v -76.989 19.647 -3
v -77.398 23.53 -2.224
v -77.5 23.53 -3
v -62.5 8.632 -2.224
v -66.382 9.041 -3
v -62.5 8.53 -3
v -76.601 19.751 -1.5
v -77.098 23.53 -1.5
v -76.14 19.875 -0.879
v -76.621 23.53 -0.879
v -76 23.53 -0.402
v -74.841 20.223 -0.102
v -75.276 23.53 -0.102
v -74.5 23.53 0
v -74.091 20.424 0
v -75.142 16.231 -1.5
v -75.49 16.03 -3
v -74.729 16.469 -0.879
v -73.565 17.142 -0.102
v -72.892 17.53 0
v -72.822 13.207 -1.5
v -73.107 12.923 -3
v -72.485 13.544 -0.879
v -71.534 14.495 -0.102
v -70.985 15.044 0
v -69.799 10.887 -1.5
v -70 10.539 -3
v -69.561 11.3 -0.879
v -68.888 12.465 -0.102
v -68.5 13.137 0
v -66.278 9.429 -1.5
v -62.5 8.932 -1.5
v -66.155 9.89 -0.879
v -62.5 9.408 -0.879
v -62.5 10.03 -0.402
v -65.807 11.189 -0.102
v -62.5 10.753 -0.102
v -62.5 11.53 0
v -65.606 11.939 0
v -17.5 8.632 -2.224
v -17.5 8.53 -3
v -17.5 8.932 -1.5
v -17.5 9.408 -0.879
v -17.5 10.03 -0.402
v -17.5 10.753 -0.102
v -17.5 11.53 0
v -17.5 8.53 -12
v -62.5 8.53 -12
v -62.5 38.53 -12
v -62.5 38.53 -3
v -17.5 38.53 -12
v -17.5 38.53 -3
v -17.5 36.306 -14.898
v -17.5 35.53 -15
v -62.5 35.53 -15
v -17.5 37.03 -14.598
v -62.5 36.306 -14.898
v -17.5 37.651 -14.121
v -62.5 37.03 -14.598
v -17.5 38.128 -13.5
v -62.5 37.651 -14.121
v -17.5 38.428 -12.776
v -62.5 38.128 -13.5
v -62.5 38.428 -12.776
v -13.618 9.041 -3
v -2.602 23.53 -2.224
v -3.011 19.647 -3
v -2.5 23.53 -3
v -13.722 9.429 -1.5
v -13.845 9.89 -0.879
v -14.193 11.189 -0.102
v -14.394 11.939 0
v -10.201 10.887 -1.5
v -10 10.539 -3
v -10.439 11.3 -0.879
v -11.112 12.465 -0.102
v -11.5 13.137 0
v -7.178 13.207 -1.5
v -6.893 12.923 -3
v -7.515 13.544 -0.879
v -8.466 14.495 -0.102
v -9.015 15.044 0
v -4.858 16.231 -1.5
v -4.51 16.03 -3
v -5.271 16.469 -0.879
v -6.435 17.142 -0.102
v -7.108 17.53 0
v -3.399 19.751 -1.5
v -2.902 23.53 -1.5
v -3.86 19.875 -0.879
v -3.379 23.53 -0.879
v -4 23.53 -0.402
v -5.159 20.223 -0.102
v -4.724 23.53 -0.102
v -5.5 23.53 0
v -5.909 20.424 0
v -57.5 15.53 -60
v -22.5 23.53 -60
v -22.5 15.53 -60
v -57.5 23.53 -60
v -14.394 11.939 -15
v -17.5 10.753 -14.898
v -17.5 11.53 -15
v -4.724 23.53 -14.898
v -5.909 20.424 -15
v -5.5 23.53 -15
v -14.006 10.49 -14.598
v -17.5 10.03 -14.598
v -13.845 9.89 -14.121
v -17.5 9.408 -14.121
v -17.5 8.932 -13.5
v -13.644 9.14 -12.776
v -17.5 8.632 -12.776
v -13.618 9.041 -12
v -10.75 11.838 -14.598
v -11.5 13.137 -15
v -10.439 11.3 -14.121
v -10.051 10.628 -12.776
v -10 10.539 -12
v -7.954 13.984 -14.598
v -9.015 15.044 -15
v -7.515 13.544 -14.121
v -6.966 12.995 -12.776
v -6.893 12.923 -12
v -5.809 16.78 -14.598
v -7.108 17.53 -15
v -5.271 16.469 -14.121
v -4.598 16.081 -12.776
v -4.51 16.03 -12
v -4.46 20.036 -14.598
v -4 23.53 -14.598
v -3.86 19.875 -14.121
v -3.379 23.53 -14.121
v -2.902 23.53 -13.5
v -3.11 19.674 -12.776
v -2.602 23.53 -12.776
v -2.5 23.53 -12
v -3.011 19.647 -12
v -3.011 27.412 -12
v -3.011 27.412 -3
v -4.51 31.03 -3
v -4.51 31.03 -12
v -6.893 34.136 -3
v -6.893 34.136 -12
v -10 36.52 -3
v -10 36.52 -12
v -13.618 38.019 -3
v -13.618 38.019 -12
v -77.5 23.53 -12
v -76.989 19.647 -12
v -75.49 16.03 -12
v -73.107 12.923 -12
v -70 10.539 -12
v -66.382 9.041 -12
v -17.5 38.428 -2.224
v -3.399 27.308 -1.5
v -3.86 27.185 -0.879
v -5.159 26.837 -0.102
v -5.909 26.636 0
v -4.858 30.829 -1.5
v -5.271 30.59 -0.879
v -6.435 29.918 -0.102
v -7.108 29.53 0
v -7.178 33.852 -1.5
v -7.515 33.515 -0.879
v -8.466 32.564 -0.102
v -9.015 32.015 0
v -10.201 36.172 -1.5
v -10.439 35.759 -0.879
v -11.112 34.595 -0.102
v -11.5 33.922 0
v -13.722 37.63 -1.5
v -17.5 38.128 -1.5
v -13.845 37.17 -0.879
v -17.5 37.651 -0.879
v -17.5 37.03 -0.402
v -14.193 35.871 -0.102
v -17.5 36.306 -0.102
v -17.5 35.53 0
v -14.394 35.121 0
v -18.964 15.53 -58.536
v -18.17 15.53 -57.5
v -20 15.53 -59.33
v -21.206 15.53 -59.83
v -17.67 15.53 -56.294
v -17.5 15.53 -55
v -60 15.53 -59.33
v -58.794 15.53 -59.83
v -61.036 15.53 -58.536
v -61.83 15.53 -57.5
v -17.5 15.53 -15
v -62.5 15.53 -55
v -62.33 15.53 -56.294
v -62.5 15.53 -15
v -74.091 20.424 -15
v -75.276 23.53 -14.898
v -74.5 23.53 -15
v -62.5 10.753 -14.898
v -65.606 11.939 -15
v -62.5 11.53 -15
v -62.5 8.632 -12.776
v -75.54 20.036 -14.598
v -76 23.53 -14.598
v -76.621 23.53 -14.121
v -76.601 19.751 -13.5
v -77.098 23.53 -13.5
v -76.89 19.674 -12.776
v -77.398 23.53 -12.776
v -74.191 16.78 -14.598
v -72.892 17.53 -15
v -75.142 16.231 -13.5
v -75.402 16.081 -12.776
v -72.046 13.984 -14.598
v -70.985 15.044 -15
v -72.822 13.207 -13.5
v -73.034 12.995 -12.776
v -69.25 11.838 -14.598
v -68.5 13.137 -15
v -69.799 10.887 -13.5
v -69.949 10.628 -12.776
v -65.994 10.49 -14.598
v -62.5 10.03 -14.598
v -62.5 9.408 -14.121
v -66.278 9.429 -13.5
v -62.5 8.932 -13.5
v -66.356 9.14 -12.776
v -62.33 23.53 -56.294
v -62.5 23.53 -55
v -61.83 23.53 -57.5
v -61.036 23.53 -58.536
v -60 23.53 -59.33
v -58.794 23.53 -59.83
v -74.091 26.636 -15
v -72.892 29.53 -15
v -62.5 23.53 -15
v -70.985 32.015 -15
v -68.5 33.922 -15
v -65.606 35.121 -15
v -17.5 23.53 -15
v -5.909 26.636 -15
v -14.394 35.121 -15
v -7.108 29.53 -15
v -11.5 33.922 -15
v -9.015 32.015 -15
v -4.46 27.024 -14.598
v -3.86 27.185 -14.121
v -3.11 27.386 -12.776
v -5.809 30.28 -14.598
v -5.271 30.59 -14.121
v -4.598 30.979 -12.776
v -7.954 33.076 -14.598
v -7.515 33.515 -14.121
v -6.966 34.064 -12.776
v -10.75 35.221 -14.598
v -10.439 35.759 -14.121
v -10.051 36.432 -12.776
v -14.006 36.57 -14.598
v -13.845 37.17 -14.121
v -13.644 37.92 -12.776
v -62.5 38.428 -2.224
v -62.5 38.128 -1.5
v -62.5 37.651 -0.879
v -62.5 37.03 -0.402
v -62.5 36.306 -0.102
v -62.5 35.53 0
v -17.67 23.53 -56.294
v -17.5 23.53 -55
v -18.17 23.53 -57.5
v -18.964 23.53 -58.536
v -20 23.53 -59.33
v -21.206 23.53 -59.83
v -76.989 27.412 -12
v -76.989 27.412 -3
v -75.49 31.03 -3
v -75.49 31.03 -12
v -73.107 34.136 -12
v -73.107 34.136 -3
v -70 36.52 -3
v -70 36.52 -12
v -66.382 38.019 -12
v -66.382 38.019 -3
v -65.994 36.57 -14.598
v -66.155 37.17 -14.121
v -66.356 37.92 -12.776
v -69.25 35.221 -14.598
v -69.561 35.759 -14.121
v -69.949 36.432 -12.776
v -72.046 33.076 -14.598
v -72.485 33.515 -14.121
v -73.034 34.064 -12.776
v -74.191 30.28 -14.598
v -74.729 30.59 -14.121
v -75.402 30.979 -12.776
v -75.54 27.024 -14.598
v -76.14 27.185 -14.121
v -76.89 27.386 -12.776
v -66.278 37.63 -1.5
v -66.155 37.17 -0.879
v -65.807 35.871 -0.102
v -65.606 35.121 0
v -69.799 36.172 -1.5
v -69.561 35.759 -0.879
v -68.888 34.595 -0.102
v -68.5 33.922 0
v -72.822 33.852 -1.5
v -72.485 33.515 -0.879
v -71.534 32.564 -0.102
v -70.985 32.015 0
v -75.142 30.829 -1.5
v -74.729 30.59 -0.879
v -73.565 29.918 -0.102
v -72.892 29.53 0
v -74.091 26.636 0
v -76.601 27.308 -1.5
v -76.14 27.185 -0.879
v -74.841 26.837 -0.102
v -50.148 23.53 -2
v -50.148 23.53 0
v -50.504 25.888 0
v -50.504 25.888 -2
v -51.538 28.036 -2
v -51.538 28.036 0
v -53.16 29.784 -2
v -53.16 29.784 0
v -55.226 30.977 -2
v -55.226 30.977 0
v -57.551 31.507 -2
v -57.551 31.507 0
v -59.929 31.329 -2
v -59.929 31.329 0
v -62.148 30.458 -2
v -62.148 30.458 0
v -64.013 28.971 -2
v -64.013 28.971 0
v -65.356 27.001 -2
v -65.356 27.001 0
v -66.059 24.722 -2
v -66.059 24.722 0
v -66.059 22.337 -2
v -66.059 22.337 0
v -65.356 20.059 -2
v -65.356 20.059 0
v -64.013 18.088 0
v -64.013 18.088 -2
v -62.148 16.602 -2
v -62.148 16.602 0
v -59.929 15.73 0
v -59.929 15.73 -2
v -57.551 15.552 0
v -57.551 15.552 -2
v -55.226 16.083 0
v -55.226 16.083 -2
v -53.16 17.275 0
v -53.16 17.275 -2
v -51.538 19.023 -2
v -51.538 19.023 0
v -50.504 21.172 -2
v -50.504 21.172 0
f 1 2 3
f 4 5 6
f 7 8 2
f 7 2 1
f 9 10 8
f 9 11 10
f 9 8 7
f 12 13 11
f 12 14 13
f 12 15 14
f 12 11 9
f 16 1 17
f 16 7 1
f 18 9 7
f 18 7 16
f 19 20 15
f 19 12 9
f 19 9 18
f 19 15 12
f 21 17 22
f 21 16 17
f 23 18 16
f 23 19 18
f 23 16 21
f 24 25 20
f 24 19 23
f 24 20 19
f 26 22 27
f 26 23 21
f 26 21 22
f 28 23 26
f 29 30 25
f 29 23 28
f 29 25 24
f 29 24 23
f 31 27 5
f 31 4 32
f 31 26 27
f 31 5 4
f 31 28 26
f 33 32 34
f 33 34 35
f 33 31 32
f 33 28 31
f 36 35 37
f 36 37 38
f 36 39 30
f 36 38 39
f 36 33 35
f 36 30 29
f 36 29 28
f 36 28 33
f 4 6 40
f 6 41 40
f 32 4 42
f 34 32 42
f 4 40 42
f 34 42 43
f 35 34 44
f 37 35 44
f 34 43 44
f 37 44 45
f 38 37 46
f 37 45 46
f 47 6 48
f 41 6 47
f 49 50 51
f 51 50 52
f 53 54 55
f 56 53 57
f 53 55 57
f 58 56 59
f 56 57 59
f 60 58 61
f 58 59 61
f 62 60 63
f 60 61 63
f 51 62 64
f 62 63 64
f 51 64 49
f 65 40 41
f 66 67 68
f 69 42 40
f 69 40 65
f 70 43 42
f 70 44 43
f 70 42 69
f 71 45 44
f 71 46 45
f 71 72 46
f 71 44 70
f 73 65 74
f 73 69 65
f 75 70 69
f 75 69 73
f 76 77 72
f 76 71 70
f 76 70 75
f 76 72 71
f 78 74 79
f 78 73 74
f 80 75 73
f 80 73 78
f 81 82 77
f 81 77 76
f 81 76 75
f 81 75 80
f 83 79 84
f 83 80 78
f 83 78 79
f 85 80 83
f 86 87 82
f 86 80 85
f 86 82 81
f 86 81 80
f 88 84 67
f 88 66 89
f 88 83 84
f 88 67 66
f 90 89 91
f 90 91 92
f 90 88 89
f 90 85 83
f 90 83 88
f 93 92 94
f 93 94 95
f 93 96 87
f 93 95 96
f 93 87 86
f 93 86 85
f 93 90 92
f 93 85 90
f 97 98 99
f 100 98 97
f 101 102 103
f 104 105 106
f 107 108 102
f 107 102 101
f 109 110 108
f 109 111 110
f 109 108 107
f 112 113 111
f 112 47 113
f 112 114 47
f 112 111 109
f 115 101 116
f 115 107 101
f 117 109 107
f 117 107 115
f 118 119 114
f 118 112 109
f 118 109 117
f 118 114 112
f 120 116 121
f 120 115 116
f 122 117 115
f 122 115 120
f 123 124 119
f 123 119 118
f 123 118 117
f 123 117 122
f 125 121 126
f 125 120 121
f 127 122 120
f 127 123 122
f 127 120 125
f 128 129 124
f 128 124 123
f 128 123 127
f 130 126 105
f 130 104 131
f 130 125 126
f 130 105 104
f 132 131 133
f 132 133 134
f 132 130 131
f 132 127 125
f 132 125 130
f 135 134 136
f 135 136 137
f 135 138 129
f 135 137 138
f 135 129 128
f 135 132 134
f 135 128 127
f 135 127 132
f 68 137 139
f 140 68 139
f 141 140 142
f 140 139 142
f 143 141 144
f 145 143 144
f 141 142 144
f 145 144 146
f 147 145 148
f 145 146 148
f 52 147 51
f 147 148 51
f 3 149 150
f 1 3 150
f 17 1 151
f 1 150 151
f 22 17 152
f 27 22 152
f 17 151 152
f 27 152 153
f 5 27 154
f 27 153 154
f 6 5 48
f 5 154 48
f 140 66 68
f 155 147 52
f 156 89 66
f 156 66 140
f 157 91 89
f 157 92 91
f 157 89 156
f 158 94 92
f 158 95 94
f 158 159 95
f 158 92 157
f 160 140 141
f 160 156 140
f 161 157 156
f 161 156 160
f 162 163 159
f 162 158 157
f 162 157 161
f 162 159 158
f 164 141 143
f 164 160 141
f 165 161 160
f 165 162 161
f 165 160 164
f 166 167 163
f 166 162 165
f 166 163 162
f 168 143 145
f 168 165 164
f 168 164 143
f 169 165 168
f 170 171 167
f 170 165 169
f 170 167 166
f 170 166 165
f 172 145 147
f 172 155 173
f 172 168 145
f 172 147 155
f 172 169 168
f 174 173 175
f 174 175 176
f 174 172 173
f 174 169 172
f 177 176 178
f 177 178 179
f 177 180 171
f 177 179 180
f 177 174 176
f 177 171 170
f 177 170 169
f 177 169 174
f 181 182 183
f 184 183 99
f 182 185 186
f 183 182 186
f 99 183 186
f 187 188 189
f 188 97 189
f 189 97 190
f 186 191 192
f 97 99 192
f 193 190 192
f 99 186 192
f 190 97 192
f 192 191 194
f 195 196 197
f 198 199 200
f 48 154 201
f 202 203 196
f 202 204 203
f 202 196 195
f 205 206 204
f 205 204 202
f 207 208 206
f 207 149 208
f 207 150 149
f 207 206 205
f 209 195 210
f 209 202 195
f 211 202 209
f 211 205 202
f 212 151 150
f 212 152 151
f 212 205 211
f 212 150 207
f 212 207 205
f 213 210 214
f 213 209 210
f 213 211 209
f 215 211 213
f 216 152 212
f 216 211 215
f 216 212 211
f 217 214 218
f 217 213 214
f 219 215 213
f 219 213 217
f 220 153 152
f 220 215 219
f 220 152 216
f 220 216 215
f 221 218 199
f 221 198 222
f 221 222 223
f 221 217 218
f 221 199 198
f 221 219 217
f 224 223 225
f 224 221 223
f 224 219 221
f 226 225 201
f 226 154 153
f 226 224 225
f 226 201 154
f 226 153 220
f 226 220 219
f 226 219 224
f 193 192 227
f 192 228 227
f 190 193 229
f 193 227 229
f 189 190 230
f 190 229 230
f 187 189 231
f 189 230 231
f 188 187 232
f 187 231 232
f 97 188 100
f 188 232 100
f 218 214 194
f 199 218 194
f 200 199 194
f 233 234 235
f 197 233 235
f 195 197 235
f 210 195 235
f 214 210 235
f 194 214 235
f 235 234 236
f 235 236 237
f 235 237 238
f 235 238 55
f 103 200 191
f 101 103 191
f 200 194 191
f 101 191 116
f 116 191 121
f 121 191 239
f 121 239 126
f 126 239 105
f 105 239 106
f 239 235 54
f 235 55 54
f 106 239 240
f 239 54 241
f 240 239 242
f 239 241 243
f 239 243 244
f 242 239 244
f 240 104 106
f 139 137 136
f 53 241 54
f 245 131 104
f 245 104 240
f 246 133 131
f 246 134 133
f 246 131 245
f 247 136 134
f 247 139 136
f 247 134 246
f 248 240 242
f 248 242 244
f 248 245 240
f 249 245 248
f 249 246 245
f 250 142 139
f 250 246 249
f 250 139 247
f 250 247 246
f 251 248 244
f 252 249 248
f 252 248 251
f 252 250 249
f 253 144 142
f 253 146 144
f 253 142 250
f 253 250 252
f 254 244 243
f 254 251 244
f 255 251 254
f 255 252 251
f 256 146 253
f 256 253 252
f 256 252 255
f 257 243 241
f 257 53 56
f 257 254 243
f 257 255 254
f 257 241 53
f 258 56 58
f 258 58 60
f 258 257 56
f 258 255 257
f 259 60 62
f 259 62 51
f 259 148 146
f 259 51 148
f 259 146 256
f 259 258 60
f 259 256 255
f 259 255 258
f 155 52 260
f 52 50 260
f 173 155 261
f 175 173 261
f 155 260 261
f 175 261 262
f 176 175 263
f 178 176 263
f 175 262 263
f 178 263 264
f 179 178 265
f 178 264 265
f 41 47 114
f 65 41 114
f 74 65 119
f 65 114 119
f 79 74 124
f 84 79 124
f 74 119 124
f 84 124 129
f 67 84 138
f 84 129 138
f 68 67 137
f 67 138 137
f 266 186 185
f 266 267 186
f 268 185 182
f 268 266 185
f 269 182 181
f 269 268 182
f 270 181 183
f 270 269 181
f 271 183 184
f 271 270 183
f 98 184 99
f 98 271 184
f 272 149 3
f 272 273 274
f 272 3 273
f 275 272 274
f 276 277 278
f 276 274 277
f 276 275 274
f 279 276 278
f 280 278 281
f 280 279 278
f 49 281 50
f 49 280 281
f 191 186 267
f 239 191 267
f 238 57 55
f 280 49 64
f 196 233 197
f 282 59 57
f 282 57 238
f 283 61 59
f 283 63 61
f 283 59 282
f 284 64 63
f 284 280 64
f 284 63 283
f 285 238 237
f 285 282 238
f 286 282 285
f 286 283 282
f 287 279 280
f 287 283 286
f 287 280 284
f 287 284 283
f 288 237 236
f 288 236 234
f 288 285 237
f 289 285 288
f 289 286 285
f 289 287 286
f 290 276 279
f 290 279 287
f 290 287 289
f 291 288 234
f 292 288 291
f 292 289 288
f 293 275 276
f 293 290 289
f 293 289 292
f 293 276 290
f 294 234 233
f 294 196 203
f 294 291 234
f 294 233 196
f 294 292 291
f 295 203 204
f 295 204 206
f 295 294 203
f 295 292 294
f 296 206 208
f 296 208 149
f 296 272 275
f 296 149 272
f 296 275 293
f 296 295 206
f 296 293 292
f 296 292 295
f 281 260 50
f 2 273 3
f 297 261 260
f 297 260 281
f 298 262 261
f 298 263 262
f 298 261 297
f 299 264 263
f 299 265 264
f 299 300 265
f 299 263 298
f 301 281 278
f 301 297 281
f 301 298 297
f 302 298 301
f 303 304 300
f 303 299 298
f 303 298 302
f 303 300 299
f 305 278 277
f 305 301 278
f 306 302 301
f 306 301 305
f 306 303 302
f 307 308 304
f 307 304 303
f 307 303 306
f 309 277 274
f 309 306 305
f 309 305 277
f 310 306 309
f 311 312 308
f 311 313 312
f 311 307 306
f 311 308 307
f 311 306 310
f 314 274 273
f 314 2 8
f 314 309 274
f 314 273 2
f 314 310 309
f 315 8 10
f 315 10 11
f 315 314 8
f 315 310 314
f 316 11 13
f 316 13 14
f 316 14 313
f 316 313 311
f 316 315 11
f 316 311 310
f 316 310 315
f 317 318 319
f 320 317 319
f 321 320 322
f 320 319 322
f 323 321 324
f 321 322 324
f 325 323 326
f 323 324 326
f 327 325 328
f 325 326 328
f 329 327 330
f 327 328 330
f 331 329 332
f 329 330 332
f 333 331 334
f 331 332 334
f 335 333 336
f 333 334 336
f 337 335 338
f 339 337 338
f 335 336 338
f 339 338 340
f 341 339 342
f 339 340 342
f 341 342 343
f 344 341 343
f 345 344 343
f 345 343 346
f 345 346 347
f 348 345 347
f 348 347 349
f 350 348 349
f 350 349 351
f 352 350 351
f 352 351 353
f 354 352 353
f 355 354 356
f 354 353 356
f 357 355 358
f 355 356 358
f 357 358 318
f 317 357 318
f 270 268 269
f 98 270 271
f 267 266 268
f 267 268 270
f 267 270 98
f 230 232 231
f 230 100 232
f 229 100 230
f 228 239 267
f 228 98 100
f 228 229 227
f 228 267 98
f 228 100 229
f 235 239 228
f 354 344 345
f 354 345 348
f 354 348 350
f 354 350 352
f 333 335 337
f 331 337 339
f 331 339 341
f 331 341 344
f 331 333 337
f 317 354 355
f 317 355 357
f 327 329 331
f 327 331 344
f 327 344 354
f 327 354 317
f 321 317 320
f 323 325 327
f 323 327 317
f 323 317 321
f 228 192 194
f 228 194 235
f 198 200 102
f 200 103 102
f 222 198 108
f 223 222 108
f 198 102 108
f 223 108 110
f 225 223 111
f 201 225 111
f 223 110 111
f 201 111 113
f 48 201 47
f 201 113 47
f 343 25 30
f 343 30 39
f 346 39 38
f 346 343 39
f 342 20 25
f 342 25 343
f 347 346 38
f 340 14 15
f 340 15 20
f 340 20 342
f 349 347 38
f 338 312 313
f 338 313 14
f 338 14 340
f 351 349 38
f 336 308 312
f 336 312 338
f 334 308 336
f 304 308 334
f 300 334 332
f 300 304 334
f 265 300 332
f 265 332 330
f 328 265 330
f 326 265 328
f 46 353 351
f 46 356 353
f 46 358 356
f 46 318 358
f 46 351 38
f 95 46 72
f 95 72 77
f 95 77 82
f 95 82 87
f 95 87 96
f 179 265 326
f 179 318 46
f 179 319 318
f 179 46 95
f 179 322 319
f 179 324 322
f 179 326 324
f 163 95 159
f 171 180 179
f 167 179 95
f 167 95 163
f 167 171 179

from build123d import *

# Parameters (mm, degrees)
SKETCH1_W           = 75
SKETCH1_H           = 30
BOSS_EXTRUDE1_DEPTH = 15
FILLET1_R           = 15
SKETCH2_W           = 45
SKETCH2_H           = 8
BOSS_EXTRUDE2_DEPTH = 45
FILLET2_R           = 5
FILLET3_R           = 3
SKETCH3_R           = 8
CUT_EXTRUDE1_DEPTH  = 2


with BuildPart() as part:
    # Sketch1 → Boss-Extrude1 (new body)
    with BuildSketch(Plane.XY):
        with Locations((-40, 23.52978815)):
            Rectangle(SKETCH1_W, SKETCH1_H)
    extrude(amount=-BOSS_EXTRUDE1_DEPTH)

    # Fillet1
    fillet1_edges = [part.edges().sort_by_distance(p)[0] for p in [
        (-77.5, 8.52978815, -7.5),
        (-77.5, 38.52978815, -7.5),
        (-2.5, 8.52978815, -7.5),
        (-2.5, 38.52978815, -7.5),
    ]]
    fillet(fillet1_edges, radius=FILLET1_R - 0.0001)  # a hair under: the kernel refuses the full size

    # Sketch2 → Boss-Extrude2 (add)
    with BuildSketch(Plane(origin=(0, 0, -15), x_dir=(-1, 0, 0), z_dir=(0, 0, -1))):
        with Locations((40, 19.52978815)):
            Rectangle(SKETCH2_W, SKETCH2_H)
    extrude(amount=BOSS_EXTRUDE2_DEPTH)

    # Fillet2
    fillet2_edges = [part.edges().sort_by_distance(p)[0] for p in [
        (-62.5, 19.52978815, -60),
        (-17.5, 19.52978815, -60),
    ]]
    fillet(fillet2_edges, radius=FILLET2_R)

    # Fillet3
    fillet3_edges = [part.edges().sort_by_distance(p)[0] for p in [
        (-40, 8.52978815, 0),
        (-40, 38.52978815, 0),
        (-6.893368993, 34.136419158, 0),
        (-6.893368993, 12.923157143, 0),
        (-73.106631007, 34.136419158, 0),
        (-73.106631007, 12.923157143, 0),
        (-40, 8.52978815, -15),
        (-40, 38.52978815, -15),
        (-6.893368993, 34.136419158, -15),
        (-6.893368993, 12.923157143, -15),
        (-73.106631007, 34.136419158, -15),
        (-73.106631007, 12.923157143, -15),
    ]]
    fillet(fillet3_edges, radius=FILLET3_R)

    # Sketch3 → Cut-Extrude1 (cut)
    with BuildSketch(Plane.XY):
        with Locations((-58.148379701, 23.52978815)):
            Circle(SKETCH3_R)
    extrude(amount=-CUT_EXTRUDE1_DEPTH, mode=Mode.SUBTRACT)


solid = part.part
